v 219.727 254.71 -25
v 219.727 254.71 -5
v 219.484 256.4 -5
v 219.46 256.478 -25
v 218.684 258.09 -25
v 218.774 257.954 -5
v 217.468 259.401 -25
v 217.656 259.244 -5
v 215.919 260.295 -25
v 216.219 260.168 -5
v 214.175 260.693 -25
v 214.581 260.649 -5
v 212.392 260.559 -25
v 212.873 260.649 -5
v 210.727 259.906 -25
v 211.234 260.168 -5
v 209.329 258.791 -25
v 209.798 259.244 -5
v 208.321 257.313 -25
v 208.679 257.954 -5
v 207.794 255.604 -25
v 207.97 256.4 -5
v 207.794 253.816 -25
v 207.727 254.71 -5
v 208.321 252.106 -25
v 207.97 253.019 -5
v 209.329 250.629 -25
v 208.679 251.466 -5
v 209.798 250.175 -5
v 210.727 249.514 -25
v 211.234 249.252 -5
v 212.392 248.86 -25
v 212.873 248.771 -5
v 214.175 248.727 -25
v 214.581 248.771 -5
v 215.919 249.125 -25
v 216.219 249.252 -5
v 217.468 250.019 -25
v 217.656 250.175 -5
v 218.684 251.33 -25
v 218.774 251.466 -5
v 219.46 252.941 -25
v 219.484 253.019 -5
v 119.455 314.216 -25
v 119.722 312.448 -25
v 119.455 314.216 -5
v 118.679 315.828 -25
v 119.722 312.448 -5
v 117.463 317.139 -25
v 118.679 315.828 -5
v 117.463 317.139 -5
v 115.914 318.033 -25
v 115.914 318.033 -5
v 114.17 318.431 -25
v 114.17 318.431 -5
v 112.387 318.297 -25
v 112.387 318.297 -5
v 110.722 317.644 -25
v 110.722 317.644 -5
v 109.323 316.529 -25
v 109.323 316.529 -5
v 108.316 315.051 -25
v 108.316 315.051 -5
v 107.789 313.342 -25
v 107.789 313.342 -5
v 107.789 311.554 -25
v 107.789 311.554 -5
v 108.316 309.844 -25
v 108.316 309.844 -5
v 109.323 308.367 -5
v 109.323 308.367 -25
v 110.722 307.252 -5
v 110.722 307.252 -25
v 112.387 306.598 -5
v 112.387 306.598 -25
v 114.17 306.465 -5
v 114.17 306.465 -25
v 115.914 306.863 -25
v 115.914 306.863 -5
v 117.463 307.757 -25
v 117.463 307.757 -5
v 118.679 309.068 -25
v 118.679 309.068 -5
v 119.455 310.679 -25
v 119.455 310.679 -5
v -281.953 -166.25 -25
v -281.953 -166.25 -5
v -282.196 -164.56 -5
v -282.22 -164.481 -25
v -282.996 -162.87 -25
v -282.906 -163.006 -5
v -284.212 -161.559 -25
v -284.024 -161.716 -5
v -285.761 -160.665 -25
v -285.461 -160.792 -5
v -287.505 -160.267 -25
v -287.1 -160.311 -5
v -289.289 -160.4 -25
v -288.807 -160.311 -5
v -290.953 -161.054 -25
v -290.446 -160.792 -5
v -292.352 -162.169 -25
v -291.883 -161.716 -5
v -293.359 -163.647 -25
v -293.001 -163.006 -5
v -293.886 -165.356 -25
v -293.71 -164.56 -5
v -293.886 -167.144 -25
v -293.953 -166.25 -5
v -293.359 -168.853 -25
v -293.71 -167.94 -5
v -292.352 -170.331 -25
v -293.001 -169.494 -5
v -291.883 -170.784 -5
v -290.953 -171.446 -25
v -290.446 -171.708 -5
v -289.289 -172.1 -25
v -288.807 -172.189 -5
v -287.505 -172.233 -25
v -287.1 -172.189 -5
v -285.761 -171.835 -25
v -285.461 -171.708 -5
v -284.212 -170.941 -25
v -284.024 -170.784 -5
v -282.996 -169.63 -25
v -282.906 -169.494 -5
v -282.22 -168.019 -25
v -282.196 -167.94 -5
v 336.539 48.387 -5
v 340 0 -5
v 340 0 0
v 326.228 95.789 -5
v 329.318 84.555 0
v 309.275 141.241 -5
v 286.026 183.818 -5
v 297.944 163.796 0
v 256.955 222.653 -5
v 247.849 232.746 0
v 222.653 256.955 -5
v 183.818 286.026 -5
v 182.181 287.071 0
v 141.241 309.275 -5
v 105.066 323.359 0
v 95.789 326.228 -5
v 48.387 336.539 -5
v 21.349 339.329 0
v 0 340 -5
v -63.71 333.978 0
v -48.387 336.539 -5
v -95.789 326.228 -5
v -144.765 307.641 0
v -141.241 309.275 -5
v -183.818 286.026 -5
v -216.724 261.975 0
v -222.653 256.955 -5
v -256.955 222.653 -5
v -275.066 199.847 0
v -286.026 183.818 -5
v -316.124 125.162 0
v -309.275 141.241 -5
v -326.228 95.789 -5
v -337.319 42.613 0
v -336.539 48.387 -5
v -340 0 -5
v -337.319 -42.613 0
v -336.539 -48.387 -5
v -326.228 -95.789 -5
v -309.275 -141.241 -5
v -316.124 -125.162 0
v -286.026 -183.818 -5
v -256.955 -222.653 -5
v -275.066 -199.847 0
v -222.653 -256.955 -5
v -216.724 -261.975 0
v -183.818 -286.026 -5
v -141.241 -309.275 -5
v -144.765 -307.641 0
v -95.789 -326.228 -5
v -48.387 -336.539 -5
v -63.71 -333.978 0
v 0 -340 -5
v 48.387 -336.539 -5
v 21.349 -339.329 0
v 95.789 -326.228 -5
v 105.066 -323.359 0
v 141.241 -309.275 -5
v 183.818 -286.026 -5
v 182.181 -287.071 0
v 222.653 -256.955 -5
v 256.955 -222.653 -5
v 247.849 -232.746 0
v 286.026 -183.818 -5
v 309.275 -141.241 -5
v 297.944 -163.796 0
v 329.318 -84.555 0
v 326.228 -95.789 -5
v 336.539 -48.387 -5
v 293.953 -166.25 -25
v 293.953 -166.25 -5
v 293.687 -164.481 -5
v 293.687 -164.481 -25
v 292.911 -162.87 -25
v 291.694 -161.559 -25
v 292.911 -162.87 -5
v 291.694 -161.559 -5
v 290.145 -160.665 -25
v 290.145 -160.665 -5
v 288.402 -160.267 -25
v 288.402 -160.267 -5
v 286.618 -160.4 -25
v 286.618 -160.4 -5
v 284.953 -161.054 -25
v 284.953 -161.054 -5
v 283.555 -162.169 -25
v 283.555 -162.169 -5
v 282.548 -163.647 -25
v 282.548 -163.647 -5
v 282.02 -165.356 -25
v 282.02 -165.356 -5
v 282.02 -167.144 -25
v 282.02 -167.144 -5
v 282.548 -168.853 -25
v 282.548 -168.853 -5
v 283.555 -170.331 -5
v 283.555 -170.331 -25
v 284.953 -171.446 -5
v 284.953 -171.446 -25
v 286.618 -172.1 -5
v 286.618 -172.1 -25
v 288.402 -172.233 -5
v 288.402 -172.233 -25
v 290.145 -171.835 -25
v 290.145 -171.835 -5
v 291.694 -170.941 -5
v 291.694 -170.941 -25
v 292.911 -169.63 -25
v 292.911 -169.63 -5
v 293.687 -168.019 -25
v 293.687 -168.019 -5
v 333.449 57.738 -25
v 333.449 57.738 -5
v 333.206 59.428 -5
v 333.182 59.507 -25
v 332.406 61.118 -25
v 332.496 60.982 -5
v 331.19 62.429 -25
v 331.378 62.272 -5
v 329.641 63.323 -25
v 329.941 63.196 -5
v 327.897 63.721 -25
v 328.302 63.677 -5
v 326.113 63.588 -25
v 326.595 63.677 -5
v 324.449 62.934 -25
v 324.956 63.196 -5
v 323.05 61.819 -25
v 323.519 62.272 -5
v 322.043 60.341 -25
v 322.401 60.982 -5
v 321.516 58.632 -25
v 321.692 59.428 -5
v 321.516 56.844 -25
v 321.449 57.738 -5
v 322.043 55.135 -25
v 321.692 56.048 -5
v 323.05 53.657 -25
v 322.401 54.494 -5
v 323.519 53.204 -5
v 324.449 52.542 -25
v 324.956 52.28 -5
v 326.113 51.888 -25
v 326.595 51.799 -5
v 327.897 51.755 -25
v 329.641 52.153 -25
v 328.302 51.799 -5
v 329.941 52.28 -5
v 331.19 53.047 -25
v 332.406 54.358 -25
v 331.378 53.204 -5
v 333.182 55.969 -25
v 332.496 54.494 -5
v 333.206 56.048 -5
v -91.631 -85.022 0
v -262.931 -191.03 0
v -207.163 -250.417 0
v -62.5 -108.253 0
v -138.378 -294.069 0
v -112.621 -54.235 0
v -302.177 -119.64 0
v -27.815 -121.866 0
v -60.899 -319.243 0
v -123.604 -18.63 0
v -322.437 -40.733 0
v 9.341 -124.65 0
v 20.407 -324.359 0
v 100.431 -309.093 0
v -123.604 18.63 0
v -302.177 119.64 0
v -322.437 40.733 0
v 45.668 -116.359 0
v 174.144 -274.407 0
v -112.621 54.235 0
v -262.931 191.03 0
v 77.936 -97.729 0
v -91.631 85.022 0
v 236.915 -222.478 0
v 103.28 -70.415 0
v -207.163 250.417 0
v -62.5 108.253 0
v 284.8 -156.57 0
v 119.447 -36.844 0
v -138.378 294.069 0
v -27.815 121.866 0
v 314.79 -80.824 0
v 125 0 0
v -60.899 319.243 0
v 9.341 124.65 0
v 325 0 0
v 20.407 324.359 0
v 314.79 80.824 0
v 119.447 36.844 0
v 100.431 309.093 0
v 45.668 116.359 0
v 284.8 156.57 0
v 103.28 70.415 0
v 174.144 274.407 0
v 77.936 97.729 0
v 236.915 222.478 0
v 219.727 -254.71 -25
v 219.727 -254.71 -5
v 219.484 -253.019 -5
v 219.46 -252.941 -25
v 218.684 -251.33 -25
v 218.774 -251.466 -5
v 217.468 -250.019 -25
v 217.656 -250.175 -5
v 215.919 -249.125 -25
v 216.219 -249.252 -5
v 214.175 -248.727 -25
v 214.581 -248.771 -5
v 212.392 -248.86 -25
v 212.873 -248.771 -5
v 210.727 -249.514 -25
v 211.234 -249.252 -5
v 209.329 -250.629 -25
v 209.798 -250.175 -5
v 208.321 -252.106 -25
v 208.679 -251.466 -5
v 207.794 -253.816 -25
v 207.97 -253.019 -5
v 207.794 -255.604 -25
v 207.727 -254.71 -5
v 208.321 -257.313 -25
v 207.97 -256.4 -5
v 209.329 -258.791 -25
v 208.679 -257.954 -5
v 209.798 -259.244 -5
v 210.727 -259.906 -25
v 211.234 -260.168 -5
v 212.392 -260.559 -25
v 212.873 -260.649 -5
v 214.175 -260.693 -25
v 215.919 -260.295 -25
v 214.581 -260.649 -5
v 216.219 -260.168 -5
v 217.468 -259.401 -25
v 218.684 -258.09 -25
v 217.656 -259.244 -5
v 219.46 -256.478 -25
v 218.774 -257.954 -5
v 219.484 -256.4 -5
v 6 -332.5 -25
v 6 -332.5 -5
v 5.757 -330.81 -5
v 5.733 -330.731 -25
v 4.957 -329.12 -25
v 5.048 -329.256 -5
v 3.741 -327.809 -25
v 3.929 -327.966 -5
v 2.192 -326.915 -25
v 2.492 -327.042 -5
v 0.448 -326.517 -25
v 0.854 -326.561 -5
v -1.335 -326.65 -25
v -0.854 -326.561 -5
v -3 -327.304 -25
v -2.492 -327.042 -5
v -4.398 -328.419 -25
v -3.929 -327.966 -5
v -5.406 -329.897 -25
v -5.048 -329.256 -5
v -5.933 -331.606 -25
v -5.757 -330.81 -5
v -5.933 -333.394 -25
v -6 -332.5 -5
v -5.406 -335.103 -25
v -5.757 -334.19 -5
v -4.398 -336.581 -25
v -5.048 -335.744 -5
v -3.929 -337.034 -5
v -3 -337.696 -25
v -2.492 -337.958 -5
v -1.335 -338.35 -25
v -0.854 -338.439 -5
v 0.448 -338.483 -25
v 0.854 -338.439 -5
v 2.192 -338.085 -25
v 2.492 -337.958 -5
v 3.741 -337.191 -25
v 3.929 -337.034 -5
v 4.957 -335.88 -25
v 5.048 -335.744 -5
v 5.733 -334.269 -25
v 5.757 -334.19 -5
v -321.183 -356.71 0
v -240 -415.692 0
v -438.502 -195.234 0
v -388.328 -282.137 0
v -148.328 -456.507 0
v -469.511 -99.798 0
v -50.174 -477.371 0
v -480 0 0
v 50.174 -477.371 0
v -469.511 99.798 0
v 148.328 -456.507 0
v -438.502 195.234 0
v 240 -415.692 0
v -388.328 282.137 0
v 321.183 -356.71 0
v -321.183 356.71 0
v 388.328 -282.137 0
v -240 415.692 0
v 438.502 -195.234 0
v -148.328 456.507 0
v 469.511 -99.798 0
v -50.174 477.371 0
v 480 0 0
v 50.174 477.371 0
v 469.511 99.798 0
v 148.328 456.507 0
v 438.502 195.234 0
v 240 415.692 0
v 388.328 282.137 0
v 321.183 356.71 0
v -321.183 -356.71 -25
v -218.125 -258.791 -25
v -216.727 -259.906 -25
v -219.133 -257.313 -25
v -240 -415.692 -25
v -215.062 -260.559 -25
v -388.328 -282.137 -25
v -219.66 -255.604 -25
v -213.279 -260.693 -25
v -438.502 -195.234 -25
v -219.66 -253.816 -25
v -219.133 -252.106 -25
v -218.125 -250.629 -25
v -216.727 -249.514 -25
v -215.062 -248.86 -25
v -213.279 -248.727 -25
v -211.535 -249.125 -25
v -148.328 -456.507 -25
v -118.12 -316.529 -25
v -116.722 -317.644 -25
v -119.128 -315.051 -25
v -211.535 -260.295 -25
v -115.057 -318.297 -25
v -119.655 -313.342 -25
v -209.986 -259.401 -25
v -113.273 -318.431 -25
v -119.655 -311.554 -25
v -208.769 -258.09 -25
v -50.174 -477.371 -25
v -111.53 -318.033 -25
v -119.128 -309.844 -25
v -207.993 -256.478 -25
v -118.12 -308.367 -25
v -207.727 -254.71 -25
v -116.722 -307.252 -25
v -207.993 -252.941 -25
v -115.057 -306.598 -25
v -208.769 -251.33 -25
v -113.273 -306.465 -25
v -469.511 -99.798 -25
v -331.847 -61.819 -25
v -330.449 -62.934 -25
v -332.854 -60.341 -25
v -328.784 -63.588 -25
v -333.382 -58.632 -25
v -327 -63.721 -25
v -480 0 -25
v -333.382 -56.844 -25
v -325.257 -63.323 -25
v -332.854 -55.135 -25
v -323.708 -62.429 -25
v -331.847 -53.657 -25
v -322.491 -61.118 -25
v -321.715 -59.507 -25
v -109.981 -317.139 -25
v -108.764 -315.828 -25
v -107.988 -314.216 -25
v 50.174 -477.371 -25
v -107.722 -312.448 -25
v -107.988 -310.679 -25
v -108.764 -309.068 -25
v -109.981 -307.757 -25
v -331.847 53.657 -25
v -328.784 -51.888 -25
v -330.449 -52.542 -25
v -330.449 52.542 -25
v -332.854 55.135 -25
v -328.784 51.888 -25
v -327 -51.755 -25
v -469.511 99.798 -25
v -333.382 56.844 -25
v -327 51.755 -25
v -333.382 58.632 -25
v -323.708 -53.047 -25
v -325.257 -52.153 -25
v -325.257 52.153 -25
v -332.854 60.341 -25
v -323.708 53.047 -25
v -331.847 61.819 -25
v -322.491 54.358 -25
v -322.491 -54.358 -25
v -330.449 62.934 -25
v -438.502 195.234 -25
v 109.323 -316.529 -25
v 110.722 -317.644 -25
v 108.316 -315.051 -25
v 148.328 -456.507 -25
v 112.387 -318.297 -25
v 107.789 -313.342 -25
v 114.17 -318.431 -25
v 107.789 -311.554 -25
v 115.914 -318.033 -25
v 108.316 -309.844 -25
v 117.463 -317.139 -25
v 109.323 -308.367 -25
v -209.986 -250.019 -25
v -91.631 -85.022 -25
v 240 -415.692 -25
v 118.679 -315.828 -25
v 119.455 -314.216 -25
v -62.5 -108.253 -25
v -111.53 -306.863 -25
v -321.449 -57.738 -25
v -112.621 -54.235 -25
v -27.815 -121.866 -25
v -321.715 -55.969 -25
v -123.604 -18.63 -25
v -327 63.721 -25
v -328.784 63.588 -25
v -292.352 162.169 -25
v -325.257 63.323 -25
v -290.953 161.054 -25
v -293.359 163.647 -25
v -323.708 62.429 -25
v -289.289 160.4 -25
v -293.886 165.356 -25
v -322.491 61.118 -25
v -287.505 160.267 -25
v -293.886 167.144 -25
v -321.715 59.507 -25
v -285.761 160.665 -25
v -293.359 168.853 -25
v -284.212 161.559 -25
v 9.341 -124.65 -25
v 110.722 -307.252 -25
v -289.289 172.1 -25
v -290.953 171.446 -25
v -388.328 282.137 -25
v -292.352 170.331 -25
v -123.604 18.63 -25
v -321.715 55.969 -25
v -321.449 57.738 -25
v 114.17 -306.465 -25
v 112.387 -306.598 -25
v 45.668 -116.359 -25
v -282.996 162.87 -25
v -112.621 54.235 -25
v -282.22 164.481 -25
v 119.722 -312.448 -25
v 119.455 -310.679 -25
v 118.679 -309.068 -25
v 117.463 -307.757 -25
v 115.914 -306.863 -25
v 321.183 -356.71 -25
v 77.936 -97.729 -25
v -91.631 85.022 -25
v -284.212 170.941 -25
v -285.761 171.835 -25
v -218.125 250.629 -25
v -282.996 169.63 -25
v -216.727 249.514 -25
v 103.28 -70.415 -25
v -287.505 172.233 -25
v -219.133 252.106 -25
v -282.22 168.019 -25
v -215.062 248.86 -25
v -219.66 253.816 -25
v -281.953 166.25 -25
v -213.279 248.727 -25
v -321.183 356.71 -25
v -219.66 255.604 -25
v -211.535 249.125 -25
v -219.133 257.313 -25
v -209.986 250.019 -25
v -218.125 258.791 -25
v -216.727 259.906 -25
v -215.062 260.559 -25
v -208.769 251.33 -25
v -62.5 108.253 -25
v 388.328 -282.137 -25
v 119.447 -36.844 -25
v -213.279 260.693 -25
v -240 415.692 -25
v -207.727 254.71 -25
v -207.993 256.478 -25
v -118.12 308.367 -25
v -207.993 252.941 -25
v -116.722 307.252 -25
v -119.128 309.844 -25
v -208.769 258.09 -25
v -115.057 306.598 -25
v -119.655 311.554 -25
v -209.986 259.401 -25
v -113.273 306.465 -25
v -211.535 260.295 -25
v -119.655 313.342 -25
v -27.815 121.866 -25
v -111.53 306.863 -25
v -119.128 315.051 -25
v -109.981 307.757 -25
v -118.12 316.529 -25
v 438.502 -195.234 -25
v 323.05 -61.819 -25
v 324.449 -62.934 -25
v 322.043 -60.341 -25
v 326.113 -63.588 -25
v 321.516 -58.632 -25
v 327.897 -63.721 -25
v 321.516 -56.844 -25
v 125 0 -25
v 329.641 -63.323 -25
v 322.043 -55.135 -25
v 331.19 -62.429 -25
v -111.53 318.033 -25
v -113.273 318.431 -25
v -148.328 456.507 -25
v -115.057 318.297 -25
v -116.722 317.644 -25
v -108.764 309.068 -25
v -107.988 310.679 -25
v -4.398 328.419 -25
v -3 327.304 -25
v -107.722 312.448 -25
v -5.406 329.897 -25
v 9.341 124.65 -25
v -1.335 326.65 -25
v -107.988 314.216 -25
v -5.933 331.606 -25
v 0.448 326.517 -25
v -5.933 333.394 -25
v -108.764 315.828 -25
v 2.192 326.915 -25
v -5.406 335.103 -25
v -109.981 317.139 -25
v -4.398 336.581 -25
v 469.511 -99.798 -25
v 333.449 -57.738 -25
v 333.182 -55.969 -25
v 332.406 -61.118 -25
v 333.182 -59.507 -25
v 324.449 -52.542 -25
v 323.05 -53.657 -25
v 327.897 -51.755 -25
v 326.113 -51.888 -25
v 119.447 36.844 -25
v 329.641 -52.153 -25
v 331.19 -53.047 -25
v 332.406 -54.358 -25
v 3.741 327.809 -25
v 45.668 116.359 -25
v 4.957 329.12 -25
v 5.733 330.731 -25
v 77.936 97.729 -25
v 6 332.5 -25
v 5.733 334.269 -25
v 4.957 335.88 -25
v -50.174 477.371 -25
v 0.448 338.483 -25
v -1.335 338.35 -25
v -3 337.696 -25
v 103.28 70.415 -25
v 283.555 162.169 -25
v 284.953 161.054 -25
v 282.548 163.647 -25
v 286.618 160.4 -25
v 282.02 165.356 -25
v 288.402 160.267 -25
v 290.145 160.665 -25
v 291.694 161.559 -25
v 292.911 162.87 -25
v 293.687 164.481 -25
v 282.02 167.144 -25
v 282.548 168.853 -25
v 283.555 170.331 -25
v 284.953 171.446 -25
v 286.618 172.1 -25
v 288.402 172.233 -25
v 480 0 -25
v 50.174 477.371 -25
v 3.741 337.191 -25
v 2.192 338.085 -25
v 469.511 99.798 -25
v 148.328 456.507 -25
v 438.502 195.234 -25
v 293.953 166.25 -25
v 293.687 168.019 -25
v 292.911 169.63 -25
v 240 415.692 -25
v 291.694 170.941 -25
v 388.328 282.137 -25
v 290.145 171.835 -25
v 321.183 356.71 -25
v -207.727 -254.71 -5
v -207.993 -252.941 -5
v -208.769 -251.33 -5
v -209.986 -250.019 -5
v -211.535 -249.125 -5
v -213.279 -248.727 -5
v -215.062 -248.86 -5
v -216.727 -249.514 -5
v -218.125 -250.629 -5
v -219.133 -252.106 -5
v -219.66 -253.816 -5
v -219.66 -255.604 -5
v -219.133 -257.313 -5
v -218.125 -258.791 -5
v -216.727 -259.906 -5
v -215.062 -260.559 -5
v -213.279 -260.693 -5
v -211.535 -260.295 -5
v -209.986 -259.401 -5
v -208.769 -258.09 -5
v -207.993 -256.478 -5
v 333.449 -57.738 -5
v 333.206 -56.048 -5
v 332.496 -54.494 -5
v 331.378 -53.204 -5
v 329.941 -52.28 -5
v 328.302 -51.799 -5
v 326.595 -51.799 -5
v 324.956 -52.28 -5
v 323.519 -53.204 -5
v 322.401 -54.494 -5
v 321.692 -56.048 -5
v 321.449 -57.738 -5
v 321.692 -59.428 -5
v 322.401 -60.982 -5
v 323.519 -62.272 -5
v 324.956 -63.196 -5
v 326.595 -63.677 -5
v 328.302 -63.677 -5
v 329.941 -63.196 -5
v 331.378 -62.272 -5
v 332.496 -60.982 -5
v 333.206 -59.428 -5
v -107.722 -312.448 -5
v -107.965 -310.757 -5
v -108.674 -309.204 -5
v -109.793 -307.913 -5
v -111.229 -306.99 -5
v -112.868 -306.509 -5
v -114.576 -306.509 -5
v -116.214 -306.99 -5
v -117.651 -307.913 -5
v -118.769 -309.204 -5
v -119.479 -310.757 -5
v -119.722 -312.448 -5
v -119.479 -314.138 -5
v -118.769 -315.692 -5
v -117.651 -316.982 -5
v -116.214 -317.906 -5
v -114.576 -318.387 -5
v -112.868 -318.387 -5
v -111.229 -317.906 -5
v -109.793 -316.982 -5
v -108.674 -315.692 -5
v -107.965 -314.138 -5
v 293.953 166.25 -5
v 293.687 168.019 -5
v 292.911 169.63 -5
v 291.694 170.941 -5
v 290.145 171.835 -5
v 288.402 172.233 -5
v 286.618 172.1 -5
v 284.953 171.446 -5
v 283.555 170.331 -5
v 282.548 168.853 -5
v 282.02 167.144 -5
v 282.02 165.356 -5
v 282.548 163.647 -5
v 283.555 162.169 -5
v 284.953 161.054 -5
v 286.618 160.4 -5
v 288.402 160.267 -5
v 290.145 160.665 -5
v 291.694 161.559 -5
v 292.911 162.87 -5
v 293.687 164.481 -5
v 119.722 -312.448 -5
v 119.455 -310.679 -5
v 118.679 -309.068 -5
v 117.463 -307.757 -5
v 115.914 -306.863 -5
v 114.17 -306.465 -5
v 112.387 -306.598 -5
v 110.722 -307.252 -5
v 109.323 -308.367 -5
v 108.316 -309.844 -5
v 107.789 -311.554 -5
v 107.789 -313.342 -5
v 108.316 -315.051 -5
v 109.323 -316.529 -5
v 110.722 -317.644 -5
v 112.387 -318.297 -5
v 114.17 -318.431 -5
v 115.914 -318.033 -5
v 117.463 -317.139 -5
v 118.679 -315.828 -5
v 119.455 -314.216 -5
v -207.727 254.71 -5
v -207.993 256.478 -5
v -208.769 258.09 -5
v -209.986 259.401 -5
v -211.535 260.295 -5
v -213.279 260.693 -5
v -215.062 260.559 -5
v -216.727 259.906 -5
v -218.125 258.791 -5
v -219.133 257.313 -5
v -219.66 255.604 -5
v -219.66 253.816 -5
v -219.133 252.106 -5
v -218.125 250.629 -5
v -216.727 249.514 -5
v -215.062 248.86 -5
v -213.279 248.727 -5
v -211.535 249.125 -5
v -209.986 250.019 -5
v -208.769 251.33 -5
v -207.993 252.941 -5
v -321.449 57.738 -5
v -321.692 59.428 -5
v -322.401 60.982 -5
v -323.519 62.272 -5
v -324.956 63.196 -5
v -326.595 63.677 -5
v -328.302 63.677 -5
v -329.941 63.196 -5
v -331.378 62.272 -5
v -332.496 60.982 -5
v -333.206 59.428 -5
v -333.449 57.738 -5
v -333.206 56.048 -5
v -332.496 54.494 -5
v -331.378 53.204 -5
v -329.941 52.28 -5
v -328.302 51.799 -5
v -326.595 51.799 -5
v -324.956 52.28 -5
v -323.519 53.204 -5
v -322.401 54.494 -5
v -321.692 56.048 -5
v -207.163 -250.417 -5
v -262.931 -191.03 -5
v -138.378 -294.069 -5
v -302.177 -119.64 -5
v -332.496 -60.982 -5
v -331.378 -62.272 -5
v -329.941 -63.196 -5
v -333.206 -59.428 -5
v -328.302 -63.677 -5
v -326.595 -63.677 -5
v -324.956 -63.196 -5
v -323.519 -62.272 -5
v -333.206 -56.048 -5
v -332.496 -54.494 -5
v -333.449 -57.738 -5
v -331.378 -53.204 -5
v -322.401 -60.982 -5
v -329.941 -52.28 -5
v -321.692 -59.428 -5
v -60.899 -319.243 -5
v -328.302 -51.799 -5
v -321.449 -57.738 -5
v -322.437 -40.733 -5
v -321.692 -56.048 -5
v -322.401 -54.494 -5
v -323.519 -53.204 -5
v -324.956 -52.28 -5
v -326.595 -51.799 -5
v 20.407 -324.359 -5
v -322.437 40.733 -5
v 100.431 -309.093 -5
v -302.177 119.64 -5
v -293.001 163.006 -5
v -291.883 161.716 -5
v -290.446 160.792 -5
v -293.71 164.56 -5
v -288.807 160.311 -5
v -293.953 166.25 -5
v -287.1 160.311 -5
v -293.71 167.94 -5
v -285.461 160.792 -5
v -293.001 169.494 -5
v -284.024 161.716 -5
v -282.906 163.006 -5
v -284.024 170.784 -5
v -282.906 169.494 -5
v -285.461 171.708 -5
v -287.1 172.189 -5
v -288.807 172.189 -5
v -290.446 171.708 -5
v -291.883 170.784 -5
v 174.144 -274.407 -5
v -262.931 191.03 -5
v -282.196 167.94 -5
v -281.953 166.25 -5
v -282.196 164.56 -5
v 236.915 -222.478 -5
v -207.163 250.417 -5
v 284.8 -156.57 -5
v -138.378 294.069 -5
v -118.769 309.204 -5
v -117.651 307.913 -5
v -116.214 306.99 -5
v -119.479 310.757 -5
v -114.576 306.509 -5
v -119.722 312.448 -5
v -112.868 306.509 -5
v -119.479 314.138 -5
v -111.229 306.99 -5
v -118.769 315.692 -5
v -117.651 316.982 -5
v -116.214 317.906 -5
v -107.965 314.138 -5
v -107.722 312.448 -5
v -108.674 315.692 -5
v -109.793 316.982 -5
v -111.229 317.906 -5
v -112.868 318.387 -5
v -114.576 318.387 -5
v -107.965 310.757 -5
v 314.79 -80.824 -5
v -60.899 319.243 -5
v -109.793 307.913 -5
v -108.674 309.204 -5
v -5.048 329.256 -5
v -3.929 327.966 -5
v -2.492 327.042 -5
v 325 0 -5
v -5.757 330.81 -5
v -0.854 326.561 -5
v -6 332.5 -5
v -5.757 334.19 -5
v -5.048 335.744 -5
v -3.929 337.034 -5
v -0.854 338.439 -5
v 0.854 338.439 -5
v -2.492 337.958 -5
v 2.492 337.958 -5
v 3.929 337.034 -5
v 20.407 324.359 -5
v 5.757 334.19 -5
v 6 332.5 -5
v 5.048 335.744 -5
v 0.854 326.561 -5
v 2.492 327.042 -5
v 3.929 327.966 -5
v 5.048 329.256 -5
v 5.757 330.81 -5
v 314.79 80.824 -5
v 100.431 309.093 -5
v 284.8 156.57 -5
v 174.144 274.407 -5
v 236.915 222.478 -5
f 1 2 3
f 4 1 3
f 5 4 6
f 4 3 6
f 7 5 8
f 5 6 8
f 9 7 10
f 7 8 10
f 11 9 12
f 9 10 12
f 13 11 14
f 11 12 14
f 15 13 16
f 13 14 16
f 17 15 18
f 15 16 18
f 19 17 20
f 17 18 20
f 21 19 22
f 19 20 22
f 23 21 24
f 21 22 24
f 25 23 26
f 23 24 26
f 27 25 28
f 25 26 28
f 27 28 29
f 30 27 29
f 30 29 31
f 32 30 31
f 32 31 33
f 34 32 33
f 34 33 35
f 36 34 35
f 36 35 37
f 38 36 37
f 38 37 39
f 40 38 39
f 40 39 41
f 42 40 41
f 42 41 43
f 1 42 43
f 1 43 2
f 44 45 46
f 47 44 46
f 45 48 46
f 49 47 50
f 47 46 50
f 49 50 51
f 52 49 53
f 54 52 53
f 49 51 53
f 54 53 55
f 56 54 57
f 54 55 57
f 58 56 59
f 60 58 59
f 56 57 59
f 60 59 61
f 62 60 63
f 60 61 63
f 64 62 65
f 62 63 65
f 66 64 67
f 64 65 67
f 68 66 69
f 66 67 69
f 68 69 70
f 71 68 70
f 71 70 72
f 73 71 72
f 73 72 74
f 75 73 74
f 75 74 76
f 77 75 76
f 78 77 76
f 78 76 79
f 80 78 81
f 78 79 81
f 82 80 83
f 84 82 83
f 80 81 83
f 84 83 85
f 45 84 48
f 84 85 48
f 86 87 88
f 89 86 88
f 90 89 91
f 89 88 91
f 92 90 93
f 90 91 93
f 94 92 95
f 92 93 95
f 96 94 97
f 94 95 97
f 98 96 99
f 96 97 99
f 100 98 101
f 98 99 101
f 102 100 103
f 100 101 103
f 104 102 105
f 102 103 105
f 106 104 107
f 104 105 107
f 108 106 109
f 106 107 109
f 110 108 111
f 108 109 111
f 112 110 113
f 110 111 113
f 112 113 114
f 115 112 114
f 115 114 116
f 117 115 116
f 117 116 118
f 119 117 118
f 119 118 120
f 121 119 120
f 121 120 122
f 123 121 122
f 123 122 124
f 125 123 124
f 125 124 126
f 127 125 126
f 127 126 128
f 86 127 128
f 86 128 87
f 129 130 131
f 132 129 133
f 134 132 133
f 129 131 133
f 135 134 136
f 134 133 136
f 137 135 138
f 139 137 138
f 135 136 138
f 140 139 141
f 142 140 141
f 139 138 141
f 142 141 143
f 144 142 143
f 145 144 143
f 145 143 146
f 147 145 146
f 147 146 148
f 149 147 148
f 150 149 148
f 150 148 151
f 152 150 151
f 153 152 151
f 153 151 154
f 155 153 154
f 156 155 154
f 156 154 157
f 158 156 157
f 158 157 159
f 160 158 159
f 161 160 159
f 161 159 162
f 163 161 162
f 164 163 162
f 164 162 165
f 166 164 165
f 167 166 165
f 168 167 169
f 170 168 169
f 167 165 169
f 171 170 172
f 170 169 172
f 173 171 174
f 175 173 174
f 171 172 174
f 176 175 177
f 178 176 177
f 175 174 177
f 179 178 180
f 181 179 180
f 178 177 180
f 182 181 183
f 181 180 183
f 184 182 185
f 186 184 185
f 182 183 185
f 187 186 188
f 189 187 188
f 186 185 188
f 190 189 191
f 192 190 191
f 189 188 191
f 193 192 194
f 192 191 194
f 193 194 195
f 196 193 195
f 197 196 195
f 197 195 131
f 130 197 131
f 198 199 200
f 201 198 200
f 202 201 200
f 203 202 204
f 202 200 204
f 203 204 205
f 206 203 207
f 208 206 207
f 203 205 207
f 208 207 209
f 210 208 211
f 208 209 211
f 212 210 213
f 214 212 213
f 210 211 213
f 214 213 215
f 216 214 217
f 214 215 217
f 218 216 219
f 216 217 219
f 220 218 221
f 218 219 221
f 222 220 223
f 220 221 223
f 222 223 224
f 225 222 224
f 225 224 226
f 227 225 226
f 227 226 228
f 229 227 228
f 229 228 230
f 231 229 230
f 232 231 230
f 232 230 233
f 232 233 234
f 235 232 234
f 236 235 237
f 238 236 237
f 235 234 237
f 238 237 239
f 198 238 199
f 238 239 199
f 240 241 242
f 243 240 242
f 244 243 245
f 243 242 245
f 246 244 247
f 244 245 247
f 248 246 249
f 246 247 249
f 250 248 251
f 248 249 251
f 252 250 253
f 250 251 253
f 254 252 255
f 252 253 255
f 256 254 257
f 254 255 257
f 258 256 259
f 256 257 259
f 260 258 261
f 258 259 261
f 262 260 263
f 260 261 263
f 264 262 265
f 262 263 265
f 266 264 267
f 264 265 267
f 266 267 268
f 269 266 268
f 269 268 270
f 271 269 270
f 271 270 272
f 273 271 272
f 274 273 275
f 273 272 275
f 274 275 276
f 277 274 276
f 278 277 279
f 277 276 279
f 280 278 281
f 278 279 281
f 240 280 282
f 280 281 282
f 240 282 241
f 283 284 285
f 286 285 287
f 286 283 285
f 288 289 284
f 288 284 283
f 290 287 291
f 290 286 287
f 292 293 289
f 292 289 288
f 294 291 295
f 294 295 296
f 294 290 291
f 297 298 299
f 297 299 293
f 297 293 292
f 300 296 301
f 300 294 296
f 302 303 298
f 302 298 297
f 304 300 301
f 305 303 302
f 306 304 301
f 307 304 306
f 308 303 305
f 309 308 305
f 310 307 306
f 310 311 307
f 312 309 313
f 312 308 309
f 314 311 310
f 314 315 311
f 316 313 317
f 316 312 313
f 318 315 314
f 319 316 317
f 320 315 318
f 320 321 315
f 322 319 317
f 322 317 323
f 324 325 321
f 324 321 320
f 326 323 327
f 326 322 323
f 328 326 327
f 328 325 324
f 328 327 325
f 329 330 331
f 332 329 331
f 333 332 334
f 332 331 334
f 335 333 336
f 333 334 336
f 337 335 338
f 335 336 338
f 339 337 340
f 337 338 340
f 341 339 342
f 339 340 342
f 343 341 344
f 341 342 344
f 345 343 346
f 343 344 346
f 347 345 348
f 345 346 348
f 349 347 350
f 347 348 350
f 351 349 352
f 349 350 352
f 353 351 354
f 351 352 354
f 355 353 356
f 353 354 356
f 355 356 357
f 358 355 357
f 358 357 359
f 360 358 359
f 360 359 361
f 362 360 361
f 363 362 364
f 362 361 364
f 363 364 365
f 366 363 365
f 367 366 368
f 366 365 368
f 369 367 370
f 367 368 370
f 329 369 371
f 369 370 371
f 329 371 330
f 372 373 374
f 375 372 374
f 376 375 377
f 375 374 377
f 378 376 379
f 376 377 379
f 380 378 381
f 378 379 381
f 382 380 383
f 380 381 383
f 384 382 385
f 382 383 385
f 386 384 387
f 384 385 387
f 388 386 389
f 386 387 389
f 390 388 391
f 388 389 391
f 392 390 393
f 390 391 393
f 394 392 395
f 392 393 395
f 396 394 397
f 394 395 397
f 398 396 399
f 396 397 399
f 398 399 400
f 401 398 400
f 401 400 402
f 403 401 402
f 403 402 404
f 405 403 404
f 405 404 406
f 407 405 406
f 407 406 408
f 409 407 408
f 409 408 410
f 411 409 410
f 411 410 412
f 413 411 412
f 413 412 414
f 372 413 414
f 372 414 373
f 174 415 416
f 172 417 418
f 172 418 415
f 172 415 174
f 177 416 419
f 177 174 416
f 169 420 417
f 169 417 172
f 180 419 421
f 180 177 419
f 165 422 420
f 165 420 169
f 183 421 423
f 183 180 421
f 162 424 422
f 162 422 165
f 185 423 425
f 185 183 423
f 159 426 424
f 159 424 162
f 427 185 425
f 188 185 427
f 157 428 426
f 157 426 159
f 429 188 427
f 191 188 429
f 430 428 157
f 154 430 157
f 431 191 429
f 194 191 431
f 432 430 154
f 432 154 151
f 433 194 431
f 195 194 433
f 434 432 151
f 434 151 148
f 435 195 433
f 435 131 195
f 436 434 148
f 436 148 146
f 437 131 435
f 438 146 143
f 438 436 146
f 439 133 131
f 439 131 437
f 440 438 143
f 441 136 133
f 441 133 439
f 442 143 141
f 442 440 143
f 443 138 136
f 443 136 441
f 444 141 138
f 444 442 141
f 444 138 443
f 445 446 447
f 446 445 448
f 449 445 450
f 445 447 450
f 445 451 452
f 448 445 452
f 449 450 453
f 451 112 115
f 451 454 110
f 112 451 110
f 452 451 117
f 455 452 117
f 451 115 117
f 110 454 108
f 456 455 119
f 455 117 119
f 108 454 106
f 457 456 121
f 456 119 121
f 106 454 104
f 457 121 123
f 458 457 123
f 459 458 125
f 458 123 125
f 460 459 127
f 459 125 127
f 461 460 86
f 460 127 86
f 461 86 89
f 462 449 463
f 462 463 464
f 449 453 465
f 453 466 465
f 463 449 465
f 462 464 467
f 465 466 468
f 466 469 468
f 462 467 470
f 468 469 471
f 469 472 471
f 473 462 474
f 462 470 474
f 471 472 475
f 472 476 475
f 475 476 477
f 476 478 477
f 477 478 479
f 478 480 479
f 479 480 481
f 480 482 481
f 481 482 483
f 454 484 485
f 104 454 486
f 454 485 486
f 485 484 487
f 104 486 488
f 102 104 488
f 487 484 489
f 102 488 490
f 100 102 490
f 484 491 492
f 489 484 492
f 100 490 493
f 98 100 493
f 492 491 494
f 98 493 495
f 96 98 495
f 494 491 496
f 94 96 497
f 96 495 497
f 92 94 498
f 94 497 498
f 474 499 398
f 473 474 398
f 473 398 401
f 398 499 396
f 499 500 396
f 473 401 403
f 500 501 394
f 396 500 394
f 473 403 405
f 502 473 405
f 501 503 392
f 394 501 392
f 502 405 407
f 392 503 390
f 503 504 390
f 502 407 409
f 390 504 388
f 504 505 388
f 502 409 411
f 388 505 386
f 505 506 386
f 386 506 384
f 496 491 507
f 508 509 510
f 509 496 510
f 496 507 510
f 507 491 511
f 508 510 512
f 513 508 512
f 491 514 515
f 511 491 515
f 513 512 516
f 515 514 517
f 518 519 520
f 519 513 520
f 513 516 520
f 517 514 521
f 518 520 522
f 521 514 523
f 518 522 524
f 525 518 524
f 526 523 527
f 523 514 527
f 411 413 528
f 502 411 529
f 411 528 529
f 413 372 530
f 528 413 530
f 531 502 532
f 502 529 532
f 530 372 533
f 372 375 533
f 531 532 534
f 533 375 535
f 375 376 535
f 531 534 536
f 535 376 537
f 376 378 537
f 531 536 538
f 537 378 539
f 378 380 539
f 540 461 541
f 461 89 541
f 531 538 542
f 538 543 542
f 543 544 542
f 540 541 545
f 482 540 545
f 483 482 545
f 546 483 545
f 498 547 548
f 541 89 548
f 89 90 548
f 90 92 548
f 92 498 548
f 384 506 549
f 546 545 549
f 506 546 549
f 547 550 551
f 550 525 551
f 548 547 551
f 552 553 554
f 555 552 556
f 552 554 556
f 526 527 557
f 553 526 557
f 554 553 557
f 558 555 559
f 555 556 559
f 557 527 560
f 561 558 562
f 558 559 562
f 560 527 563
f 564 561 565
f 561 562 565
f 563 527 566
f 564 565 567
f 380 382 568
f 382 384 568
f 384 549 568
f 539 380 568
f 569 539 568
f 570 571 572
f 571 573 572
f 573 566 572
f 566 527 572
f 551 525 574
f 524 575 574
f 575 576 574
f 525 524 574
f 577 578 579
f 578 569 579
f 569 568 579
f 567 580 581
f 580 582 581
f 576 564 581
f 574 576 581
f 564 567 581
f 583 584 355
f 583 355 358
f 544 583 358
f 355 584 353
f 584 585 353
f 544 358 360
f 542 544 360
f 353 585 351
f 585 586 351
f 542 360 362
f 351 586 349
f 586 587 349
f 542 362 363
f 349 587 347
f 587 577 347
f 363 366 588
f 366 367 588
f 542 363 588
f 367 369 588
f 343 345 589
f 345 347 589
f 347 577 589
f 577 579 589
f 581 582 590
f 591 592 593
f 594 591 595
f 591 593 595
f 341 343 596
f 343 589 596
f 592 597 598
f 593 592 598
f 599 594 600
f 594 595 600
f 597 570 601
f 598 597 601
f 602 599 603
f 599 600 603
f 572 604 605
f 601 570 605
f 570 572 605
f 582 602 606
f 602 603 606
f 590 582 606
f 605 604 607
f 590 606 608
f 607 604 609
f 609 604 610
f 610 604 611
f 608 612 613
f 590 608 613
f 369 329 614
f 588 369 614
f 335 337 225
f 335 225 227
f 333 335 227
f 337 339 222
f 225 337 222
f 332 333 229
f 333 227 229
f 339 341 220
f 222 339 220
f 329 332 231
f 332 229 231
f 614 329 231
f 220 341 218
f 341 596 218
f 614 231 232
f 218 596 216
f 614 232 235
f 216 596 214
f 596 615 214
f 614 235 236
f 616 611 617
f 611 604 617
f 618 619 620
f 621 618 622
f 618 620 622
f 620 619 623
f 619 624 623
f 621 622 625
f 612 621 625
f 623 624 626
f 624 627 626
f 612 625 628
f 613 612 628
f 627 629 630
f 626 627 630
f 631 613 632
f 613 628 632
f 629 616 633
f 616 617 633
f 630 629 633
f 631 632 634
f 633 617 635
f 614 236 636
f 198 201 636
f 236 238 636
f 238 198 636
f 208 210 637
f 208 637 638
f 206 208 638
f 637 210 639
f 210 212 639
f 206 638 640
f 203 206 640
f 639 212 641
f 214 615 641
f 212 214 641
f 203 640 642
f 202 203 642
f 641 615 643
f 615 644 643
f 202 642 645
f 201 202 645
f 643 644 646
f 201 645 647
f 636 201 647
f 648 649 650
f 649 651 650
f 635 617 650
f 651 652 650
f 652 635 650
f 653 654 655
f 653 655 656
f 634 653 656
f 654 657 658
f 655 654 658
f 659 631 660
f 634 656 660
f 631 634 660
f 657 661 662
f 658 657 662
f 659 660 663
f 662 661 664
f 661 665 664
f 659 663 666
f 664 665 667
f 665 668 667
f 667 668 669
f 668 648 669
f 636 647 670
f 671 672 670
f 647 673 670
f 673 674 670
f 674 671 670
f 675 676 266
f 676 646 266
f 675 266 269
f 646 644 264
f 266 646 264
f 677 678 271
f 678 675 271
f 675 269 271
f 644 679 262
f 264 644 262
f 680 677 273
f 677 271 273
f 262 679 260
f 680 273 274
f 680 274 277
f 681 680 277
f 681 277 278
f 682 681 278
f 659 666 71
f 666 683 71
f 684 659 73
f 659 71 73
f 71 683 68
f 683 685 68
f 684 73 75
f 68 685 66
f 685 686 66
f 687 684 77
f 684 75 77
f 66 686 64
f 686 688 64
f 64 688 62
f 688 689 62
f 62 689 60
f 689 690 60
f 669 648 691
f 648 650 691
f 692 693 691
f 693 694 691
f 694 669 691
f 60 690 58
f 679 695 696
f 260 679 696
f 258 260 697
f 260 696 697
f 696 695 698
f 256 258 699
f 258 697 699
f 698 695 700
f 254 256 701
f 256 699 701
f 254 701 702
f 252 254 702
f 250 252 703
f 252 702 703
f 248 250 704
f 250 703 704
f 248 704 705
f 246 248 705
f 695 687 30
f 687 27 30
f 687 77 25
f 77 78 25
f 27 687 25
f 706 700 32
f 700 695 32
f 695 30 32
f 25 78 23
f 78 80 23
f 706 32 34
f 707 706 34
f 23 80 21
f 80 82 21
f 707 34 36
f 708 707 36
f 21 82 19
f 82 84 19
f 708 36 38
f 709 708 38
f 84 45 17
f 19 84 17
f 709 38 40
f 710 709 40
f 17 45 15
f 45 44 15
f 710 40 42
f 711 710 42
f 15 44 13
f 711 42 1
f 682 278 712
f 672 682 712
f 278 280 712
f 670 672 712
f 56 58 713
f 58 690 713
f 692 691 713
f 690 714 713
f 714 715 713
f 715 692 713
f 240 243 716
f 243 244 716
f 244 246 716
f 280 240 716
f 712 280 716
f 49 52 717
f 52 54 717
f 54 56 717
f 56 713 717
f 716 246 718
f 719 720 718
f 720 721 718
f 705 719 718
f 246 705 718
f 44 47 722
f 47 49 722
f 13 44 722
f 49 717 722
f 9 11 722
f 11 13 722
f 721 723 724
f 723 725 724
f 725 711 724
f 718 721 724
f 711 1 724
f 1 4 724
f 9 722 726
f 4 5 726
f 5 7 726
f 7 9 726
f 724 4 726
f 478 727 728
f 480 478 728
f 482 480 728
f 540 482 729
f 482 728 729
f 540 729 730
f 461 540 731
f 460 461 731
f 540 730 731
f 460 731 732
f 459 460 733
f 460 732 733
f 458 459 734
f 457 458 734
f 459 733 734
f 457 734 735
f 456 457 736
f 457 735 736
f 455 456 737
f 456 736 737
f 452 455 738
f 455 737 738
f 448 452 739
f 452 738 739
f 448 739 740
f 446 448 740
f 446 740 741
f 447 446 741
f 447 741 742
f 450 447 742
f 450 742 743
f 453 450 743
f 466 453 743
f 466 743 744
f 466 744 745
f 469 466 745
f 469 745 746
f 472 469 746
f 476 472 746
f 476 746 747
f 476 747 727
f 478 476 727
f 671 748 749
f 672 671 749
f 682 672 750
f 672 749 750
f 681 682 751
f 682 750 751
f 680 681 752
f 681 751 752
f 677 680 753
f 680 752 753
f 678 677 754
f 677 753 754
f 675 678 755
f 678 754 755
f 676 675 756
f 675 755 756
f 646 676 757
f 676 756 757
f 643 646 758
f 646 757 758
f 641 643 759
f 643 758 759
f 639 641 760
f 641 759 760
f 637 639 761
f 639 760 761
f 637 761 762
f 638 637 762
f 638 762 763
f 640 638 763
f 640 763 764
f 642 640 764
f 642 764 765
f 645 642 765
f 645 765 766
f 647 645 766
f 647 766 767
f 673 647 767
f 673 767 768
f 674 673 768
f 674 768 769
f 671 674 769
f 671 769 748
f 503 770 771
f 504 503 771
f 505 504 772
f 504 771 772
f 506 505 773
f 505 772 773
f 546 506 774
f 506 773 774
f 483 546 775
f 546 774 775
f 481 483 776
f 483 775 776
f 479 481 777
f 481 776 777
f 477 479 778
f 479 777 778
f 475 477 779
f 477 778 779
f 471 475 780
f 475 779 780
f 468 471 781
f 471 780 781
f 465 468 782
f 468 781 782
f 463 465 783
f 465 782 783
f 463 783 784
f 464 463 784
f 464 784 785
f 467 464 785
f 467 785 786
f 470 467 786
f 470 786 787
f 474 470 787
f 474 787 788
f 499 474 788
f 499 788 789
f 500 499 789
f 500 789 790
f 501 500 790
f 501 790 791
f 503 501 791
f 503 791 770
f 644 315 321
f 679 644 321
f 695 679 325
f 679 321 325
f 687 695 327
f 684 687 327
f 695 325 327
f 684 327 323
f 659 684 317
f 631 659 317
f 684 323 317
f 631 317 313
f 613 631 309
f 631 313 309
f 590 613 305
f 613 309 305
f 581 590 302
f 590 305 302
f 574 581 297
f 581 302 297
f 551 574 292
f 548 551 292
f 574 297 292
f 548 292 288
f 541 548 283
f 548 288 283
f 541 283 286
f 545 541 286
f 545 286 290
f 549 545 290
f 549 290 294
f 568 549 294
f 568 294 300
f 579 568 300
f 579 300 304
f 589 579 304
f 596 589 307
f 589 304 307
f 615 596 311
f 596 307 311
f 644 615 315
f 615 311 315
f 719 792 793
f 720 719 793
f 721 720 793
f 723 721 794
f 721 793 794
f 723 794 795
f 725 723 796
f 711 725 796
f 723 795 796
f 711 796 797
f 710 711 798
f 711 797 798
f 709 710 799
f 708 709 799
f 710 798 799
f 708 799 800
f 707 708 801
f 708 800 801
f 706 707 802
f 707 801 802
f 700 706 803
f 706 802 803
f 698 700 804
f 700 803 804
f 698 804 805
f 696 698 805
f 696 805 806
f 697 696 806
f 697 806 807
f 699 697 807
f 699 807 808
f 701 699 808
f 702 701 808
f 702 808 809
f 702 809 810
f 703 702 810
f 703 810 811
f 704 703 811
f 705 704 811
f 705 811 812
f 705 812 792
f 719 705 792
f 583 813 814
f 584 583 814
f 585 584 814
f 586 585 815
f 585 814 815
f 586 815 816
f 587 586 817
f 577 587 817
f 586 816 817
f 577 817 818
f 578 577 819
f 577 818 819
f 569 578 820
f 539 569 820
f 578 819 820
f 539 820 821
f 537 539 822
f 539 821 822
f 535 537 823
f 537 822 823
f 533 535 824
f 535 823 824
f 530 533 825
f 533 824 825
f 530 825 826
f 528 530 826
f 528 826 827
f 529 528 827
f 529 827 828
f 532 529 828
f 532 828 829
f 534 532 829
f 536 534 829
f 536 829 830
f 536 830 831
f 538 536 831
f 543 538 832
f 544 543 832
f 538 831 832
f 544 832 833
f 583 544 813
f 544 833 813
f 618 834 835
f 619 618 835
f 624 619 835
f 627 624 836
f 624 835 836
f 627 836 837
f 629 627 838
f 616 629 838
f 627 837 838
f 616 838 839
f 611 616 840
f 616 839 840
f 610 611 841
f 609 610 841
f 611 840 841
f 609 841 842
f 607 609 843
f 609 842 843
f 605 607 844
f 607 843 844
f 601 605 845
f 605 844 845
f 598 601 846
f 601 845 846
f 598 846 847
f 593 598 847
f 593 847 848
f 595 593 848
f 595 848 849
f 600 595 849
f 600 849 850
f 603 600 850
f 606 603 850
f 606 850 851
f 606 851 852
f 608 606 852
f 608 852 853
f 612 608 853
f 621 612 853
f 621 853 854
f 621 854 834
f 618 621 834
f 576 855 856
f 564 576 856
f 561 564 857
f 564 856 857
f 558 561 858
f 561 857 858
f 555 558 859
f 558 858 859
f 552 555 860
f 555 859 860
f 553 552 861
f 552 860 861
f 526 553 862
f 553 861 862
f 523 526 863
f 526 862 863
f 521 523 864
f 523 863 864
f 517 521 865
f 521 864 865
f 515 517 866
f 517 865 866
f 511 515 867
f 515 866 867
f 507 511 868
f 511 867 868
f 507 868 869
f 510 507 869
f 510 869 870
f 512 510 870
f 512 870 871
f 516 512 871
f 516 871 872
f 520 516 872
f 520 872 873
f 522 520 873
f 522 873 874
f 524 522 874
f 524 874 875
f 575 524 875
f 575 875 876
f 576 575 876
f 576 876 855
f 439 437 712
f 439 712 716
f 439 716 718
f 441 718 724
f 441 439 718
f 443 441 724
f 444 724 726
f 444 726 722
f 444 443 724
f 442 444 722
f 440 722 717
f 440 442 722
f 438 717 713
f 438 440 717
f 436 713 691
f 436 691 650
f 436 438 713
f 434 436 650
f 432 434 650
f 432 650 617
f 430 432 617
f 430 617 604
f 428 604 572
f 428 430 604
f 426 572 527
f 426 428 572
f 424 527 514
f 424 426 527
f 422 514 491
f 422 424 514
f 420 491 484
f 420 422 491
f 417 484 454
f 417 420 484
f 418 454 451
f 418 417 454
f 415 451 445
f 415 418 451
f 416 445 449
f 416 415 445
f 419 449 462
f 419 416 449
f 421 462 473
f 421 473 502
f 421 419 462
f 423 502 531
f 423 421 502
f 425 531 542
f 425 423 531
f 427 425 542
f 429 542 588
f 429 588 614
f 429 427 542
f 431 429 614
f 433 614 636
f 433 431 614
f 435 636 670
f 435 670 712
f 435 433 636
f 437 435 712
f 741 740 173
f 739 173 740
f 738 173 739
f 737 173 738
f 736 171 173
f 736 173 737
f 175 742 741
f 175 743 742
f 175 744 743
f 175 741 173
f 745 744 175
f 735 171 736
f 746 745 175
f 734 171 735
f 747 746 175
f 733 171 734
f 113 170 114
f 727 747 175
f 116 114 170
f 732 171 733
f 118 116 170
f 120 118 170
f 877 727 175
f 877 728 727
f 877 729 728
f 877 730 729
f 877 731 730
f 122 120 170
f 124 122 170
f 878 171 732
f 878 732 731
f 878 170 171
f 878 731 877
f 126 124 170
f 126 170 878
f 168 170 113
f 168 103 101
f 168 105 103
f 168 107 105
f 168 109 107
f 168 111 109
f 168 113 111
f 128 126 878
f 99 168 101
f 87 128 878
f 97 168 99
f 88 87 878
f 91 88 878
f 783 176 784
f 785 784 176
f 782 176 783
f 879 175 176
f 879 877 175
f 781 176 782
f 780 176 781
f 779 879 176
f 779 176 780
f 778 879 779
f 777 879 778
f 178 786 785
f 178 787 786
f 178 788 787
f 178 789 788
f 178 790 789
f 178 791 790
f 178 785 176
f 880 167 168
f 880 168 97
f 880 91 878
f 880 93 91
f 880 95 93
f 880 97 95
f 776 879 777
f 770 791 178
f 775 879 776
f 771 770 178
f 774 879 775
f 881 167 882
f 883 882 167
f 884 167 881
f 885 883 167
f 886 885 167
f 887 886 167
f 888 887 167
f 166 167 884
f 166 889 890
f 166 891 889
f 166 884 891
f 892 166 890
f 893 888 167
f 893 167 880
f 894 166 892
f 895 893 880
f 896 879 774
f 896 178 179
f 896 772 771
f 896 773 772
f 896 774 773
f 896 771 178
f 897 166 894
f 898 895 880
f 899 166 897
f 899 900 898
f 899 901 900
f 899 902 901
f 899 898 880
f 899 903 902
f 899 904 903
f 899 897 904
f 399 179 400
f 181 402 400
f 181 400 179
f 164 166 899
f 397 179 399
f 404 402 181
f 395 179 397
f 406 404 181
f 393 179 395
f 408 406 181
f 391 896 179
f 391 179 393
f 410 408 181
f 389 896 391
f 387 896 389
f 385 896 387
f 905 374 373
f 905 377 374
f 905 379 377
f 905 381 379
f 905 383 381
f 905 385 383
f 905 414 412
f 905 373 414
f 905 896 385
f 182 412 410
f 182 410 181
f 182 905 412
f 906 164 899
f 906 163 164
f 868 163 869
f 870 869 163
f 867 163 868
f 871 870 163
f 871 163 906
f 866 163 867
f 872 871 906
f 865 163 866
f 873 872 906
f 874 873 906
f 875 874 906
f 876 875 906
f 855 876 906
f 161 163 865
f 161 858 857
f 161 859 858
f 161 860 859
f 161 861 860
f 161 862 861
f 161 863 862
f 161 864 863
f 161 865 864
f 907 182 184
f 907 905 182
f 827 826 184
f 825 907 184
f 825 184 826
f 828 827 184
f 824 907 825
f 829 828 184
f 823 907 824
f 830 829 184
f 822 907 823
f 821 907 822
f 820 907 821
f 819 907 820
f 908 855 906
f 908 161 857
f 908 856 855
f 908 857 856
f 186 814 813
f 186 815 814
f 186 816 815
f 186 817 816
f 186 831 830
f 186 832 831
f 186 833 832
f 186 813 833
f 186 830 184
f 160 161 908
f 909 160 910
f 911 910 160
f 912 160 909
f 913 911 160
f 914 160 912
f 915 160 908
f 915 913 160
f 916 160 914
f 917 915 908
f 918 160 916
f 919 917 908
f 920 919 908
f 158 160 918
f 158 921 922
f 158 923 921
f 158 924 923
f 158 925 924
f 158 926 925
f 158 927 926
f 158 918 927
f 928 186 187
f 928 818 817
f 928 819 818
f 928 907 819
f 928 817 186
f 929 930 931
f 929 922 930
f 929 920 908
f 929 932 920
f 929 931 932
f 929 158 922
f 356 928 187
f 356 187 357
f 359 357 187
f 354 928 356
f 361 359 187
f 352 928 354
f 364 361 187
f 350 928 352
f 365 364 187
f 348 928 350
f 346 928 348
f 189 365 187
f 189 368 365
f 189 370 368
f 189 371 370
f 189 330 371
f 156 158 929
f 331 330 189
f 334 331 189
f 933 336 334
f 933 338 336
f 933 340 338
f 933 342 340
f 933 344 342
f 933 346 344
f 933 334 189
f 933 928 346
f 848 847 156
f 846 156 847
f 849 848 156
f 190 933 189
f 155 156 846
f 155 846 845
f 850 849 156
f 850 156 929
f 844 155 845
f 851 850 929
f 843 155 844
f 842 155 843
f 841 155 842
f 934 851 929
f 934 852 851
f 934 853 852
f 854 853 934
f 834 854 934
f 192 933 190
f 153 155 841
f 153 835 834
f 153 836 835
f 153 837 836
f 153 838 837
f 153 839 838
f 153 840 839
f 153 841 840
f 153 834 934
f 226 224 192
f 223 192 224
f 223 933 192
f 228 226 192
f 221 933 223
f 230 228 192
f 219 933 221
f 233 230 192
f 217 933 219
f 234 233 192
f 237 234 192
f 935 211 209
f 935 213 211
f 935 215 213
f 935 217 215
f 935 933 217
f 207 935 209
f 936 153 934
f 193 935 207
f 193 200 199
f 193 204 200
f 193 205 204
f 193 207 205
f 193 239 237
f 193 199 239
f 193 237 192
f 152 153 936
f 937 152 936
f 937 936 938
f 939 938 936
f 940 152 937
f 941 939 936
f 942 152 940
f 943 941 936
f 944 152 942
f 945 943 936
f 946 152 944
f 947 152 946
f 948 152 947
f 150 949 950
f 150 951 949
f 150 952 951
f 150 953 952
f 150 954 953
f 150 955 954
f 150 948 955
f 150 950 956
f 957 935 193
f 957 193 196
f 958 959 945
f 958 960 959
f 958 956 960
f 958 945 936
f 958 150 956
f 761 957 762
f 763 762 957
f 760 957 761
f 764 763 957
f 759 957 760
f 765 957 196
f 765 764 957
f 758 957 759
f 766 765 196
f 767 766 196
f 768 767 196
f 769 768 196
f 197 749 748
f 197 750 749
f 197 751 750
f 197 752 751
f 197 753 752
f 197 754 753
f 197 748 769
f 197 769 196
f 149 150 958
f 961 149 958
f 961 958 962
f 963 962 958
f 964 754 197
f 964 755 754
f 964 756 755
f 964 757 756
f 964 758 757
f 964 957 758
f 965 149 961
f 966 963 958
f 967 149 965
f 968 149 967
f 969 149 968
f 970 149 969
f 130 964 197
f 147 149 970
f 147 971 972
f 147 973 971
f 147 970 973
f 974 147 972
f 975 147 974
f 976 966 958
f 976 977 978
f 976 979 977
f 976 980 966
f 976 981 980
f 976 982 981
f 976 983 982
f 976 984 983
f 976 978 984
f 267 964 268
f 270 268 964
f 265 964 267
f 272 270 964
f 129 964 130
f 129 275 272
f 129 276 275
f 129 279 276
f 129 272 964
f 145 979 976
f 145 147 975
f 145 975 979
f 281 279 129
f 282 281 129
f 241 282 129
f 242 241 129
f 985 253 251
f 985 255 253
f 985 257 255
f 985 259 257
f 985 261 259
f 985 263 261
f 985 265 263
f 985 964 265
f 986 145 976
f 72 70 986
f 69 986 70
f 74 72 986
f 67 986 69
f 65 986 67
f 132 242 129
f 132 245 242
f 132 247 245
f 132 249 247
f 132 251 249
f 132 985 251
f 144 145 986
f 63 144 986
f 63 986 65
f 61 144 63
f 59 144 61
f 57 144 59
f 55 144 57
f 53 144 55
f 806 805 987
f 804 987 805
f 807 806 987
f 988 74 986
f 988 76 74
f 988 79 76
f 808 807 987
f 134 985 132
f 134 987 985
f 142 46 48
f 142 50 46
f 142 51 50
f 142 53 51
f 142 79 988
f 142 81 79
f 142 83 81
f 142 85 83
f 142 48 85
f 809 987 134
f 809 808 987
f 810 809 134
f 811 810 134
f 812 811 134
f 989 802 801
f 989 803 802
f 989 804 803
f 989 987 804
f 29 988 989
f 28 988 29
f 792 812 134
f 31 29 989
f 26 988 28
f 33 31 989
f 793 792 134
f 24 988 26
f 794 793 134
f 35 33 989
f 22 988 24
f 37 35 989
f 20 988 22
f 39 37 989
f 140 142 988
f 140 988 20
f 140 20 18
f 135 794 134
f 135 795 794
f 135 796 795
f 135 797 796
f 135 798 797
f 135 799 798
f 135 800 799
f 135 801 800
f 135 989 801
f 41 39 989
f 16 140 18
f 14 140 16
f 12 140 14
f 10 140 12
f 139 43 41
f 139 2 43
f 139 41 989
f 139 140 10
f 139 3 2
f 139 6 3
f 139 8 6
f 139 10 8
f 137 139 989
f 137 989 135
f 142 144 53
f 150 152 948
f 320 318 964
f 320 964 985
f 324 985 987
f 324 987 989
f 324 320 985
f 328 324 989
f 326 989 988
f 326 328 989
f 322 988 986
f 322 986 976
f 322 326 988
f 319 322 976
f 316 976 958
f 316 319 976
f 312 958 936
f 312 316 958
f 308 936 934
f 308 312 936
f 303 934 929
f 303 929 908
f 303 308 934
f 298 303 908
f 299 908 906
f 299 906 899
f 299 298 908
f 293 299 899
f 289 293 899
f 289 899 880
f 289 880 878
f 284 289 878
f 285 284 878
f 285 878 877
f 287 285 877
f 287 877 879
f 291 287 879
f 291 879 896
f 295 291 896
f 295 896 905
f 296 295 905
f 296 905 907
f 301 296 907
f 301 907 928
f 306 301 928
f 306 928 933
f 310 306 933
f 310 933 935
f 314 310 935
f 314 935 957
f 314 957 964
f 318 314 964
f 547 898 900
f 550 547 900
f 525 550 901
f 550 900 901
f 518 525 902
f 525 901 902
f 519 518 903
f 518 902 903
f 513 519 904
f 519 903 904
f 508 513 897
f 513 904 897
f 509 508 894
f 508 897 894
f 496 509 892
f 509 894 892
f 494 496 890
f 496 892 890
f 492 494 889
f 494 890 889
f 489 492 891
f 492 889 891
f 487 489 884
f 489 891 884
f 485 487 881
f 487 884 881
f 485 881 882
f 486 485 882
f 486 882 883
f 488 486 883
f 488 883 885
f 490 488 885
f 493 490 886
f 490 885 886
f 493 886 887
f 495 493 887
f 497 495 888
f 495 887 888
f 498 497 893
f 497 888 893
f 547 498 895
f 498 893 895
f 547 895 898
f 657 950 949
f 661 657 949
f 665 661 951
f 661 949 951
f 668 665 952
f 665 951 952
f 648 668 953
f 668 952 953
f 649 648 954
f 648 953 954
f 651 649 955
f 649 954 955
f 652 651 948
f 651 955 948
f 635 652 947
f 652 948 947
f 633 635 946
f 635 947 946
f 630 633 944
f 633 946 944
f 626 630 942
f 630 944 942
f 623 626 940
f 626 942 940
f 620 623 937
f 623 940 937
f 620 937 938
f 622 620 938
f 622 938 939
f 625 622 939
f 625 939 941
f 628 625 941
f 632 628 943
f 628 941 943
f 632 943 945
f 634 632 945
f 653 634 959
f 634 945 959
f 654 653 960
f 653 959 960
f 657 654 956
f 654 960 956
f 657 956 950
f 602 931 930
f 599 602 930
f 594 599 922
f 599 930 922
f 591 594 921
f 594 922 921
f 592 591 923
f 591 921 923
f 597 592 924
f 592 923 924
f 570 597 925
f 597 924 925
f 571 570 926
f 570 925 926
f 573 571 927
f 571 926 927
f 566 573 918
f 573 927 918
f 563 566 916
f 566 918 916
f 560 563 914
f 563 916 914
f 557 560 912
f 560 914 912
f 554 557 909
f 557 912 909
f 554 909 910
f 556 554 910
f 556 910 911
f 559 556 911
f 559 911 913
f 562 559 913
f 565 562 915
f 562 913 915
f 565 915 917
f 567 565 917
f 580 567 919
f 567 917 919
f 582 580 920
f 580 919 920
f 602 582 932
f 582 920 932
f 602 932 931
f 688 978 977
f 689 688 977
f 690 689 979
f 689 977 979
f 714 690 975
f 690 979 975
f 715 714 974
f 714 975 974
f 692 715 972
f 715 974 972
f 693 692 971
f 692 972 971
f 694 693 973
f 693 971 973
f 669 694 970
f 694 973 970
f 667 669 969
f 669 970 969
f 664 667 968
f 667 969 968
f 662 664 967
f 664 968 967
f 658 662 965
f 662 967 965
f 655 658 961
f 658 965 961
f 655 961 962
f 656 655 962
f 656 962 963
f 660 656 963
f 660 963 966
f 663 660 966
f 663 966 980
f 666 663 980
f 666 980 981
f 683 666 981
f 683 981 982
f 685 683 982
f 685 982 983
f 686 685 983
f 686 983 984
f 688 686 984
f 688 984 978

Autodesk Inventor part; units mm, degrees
ref_plane "YZ Plane" through (0, 0, 0) normal (1, 0, 0) x (0, 1, 0)
ref_plane "XZ Plane" through (0, 0, 0) normal (0, 1, 0) x (-1, 0, 0)
ref_plane "XY Plane" through (0, 0, 0) normal (0, 0, 1) x (1, 0, 0)
sketch "Boceto1" plane through (0, 0, 0) normal (0, 0, 1) x (1, 0, 0)
  circle A0 centre (0, 0) radius 125
  circle A1 centre (0, 0) radius 480
  dimension "d0" = 960
  dimension "d1" = 250
extrude "Extrusión1" add sketch "Boceto1" against normal blind 25
sketch "Boceto2" plane through (0, 0, 0) normal (0, 0, 1) x (1, 0, 0)
  circle A0 centre (0, 0) radius 340
  circle A1 centre (0, 0) radius 325
  dimension "d4" = 680
  dimension "d5" = 650
extrude "Extrusión2" cut sketch "Boceto2" against normal blind 5
sketch "Boceto3" plane through (0, 0, 0) normal (0, 0, 1) x (1, 0, 0)
  circle A0 centre (0, 0) radius 332.5 construction
  circle A1 centre (0, 332.5) radius 6
  circle A2 centre (-113.7217, 312.4478) radius 6
  circle A3 centre (-213.7269, 254.7098) radius 6
  circle A4 centre (-287.9534, 166.25) radius 6
  circle A5 centre (-327.4486, 57.738) radius 6
  circle A6 centre (-327.4486, -57.738) radius 6
  circle A7 centre (-287.9534, -166.25) radius 6
  circle A8 centre (-213.7269, -254.7098) radius 6
  circle A9 centre (-113.7217, -312.4478) radius 6
  circle A10 centre (0, -332.5) radius 6
  circle A11 centre (113.7217, -312.4478) radius 6
  circle A12 centre (213.7269, -254.7098) radius 6
  circle A13 centre (287.9534, -166.25) radius 6
  circle A14 centre (327.4486, -57.738) radius 6
  circle A15 centre (327.4486, 57.738) radius 6
  circle A16 centre (287.9534, 166.25) radius 6
  circle A17 centre (213.7269, 254.7098) radius 6
  circle A18 centre (113.7217, 312.4478) radius 6
  dimension "d8" = 665
  dimension "d9" = 12
  dimension "d12" = 360
extrude "Extrusión3" cut sketch "Boceto3" against normal up to next
properties part number "Brida_2 (flange_2)"
